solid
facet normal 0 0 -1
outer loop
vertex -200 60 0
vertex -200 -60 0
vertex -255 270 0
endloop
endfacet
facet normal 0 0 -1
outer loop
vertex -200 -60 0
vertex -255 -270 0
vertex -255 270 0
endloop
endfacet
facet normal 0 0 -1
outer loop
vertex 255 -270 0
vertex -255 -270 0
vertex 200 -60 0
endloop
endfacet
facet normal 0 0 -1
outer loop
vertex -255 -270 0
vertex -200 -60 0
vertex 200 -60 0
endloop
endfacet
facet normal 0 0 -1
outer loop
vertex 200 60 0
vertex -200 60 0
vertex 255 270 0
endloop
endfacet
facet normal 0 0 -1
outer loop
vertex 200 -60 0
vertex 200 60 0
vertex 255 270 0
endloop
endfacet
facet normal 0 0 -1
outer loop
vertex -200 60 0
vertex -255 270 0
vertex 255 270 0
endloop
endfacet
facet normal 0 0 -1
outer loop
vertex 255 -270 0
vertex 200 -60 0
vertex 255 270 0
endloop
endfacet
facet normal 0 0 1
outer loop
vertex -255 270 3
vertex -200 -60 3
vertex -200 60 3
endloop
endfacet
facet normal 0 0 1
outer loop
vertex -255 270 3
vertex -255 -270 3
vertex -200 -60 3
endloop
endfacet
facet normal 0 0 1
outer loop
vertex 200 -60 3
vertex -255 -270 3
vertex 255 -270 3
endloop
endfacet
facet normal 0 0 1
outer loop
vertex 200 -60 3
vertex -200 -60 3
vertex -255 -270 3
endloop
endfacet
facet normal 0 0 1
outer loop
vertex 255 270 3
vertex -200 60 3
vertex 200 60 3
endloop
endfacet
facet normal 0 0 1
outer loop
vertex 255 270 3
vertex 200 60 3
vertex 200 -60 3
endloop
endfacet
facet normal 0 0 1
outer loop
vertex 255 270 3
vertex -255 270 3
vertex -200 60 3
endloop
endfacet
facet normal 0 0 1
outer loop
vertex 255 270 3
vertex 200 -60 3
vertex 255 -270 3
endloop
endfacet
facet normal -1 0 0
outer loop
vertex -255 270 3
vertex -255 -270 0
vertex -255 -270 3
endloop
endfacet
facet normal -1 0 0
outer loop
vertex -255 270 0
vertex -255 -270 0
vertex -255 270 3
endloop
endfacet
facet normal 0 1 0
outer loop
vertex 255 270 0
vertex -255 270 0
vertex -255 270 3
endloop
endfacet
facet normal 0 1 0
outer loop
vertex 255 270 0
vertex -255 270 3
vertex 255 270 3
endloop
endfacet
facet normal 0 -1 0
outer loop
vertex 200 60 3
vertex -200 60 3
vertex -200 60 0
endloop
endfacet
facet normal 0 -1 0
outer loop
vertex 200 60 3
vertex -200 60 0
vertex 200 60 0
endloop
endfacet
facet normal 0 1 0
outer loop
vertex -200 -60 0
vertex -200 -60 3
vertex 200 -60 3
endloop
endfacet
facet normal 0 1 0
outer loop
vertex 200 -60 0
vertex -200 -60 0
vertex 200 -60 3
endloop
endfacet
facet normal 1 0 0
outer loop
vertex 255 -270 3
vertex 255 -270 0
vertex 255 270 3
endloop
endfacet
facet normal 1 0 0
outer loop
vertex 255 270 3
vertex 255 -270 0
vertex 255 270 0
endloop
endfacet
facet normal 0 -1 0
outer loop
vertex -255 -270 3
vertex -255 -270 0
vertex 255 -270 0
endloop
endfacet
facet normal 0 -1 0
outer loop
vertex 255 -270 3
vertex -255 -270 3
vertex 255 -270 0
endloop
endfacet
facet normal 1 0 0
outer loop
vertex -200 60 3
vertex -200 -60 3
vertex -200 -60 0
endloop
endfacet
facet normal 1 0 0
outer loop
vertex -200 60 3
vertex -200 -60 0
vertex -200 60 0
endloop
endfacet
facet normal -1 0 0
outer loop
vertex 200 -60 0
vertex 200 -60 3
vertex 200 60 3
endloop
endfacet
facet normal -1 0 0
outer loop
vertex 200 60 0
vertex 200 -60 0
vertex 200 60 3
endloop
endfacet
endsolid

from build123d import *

# Parameters (mm, degrees)
SKETCH1_W           = 510
SKETCH1_H           = 540
BOSS_EXTRUDE1_DEPTH = 3
CUT_EXTRUDE2_REACH  = 373.395
SKETCH3_W           = 400
SKETCH3_H           = 120


with BuildPart() as part:
    # Sketch1 → Boss-Extrude1 (new body)
    with BuildSketch(Plane.XY):
        Rectangle(SKETCH1_W, SKETCH1_H)
    extrude(amount=BOSS_EXTRUDE1_DEPTH)

    # Sketch3 → Cut-Extrude2 (cut, up to next)
    with BuildSketch(Plane.XY.offset(3), mode=Mode.PRIVATE) as cut_extrude2_sk1:
        Rectangle(SKETCH3_W, SKETCH3_H)
    cut_extrude2_tool1 = extrude(cut_extrude2_sk1.sketch, amount=-CUT_EXTRUDE2_REACH, mode=Mode.PRIVATE) & part.part
    add(cut_extrude2_tool1.solids().sort_by_distance((0, 0, 3))[0], mode=Mode.SUBTRACT)


solid = part.part
